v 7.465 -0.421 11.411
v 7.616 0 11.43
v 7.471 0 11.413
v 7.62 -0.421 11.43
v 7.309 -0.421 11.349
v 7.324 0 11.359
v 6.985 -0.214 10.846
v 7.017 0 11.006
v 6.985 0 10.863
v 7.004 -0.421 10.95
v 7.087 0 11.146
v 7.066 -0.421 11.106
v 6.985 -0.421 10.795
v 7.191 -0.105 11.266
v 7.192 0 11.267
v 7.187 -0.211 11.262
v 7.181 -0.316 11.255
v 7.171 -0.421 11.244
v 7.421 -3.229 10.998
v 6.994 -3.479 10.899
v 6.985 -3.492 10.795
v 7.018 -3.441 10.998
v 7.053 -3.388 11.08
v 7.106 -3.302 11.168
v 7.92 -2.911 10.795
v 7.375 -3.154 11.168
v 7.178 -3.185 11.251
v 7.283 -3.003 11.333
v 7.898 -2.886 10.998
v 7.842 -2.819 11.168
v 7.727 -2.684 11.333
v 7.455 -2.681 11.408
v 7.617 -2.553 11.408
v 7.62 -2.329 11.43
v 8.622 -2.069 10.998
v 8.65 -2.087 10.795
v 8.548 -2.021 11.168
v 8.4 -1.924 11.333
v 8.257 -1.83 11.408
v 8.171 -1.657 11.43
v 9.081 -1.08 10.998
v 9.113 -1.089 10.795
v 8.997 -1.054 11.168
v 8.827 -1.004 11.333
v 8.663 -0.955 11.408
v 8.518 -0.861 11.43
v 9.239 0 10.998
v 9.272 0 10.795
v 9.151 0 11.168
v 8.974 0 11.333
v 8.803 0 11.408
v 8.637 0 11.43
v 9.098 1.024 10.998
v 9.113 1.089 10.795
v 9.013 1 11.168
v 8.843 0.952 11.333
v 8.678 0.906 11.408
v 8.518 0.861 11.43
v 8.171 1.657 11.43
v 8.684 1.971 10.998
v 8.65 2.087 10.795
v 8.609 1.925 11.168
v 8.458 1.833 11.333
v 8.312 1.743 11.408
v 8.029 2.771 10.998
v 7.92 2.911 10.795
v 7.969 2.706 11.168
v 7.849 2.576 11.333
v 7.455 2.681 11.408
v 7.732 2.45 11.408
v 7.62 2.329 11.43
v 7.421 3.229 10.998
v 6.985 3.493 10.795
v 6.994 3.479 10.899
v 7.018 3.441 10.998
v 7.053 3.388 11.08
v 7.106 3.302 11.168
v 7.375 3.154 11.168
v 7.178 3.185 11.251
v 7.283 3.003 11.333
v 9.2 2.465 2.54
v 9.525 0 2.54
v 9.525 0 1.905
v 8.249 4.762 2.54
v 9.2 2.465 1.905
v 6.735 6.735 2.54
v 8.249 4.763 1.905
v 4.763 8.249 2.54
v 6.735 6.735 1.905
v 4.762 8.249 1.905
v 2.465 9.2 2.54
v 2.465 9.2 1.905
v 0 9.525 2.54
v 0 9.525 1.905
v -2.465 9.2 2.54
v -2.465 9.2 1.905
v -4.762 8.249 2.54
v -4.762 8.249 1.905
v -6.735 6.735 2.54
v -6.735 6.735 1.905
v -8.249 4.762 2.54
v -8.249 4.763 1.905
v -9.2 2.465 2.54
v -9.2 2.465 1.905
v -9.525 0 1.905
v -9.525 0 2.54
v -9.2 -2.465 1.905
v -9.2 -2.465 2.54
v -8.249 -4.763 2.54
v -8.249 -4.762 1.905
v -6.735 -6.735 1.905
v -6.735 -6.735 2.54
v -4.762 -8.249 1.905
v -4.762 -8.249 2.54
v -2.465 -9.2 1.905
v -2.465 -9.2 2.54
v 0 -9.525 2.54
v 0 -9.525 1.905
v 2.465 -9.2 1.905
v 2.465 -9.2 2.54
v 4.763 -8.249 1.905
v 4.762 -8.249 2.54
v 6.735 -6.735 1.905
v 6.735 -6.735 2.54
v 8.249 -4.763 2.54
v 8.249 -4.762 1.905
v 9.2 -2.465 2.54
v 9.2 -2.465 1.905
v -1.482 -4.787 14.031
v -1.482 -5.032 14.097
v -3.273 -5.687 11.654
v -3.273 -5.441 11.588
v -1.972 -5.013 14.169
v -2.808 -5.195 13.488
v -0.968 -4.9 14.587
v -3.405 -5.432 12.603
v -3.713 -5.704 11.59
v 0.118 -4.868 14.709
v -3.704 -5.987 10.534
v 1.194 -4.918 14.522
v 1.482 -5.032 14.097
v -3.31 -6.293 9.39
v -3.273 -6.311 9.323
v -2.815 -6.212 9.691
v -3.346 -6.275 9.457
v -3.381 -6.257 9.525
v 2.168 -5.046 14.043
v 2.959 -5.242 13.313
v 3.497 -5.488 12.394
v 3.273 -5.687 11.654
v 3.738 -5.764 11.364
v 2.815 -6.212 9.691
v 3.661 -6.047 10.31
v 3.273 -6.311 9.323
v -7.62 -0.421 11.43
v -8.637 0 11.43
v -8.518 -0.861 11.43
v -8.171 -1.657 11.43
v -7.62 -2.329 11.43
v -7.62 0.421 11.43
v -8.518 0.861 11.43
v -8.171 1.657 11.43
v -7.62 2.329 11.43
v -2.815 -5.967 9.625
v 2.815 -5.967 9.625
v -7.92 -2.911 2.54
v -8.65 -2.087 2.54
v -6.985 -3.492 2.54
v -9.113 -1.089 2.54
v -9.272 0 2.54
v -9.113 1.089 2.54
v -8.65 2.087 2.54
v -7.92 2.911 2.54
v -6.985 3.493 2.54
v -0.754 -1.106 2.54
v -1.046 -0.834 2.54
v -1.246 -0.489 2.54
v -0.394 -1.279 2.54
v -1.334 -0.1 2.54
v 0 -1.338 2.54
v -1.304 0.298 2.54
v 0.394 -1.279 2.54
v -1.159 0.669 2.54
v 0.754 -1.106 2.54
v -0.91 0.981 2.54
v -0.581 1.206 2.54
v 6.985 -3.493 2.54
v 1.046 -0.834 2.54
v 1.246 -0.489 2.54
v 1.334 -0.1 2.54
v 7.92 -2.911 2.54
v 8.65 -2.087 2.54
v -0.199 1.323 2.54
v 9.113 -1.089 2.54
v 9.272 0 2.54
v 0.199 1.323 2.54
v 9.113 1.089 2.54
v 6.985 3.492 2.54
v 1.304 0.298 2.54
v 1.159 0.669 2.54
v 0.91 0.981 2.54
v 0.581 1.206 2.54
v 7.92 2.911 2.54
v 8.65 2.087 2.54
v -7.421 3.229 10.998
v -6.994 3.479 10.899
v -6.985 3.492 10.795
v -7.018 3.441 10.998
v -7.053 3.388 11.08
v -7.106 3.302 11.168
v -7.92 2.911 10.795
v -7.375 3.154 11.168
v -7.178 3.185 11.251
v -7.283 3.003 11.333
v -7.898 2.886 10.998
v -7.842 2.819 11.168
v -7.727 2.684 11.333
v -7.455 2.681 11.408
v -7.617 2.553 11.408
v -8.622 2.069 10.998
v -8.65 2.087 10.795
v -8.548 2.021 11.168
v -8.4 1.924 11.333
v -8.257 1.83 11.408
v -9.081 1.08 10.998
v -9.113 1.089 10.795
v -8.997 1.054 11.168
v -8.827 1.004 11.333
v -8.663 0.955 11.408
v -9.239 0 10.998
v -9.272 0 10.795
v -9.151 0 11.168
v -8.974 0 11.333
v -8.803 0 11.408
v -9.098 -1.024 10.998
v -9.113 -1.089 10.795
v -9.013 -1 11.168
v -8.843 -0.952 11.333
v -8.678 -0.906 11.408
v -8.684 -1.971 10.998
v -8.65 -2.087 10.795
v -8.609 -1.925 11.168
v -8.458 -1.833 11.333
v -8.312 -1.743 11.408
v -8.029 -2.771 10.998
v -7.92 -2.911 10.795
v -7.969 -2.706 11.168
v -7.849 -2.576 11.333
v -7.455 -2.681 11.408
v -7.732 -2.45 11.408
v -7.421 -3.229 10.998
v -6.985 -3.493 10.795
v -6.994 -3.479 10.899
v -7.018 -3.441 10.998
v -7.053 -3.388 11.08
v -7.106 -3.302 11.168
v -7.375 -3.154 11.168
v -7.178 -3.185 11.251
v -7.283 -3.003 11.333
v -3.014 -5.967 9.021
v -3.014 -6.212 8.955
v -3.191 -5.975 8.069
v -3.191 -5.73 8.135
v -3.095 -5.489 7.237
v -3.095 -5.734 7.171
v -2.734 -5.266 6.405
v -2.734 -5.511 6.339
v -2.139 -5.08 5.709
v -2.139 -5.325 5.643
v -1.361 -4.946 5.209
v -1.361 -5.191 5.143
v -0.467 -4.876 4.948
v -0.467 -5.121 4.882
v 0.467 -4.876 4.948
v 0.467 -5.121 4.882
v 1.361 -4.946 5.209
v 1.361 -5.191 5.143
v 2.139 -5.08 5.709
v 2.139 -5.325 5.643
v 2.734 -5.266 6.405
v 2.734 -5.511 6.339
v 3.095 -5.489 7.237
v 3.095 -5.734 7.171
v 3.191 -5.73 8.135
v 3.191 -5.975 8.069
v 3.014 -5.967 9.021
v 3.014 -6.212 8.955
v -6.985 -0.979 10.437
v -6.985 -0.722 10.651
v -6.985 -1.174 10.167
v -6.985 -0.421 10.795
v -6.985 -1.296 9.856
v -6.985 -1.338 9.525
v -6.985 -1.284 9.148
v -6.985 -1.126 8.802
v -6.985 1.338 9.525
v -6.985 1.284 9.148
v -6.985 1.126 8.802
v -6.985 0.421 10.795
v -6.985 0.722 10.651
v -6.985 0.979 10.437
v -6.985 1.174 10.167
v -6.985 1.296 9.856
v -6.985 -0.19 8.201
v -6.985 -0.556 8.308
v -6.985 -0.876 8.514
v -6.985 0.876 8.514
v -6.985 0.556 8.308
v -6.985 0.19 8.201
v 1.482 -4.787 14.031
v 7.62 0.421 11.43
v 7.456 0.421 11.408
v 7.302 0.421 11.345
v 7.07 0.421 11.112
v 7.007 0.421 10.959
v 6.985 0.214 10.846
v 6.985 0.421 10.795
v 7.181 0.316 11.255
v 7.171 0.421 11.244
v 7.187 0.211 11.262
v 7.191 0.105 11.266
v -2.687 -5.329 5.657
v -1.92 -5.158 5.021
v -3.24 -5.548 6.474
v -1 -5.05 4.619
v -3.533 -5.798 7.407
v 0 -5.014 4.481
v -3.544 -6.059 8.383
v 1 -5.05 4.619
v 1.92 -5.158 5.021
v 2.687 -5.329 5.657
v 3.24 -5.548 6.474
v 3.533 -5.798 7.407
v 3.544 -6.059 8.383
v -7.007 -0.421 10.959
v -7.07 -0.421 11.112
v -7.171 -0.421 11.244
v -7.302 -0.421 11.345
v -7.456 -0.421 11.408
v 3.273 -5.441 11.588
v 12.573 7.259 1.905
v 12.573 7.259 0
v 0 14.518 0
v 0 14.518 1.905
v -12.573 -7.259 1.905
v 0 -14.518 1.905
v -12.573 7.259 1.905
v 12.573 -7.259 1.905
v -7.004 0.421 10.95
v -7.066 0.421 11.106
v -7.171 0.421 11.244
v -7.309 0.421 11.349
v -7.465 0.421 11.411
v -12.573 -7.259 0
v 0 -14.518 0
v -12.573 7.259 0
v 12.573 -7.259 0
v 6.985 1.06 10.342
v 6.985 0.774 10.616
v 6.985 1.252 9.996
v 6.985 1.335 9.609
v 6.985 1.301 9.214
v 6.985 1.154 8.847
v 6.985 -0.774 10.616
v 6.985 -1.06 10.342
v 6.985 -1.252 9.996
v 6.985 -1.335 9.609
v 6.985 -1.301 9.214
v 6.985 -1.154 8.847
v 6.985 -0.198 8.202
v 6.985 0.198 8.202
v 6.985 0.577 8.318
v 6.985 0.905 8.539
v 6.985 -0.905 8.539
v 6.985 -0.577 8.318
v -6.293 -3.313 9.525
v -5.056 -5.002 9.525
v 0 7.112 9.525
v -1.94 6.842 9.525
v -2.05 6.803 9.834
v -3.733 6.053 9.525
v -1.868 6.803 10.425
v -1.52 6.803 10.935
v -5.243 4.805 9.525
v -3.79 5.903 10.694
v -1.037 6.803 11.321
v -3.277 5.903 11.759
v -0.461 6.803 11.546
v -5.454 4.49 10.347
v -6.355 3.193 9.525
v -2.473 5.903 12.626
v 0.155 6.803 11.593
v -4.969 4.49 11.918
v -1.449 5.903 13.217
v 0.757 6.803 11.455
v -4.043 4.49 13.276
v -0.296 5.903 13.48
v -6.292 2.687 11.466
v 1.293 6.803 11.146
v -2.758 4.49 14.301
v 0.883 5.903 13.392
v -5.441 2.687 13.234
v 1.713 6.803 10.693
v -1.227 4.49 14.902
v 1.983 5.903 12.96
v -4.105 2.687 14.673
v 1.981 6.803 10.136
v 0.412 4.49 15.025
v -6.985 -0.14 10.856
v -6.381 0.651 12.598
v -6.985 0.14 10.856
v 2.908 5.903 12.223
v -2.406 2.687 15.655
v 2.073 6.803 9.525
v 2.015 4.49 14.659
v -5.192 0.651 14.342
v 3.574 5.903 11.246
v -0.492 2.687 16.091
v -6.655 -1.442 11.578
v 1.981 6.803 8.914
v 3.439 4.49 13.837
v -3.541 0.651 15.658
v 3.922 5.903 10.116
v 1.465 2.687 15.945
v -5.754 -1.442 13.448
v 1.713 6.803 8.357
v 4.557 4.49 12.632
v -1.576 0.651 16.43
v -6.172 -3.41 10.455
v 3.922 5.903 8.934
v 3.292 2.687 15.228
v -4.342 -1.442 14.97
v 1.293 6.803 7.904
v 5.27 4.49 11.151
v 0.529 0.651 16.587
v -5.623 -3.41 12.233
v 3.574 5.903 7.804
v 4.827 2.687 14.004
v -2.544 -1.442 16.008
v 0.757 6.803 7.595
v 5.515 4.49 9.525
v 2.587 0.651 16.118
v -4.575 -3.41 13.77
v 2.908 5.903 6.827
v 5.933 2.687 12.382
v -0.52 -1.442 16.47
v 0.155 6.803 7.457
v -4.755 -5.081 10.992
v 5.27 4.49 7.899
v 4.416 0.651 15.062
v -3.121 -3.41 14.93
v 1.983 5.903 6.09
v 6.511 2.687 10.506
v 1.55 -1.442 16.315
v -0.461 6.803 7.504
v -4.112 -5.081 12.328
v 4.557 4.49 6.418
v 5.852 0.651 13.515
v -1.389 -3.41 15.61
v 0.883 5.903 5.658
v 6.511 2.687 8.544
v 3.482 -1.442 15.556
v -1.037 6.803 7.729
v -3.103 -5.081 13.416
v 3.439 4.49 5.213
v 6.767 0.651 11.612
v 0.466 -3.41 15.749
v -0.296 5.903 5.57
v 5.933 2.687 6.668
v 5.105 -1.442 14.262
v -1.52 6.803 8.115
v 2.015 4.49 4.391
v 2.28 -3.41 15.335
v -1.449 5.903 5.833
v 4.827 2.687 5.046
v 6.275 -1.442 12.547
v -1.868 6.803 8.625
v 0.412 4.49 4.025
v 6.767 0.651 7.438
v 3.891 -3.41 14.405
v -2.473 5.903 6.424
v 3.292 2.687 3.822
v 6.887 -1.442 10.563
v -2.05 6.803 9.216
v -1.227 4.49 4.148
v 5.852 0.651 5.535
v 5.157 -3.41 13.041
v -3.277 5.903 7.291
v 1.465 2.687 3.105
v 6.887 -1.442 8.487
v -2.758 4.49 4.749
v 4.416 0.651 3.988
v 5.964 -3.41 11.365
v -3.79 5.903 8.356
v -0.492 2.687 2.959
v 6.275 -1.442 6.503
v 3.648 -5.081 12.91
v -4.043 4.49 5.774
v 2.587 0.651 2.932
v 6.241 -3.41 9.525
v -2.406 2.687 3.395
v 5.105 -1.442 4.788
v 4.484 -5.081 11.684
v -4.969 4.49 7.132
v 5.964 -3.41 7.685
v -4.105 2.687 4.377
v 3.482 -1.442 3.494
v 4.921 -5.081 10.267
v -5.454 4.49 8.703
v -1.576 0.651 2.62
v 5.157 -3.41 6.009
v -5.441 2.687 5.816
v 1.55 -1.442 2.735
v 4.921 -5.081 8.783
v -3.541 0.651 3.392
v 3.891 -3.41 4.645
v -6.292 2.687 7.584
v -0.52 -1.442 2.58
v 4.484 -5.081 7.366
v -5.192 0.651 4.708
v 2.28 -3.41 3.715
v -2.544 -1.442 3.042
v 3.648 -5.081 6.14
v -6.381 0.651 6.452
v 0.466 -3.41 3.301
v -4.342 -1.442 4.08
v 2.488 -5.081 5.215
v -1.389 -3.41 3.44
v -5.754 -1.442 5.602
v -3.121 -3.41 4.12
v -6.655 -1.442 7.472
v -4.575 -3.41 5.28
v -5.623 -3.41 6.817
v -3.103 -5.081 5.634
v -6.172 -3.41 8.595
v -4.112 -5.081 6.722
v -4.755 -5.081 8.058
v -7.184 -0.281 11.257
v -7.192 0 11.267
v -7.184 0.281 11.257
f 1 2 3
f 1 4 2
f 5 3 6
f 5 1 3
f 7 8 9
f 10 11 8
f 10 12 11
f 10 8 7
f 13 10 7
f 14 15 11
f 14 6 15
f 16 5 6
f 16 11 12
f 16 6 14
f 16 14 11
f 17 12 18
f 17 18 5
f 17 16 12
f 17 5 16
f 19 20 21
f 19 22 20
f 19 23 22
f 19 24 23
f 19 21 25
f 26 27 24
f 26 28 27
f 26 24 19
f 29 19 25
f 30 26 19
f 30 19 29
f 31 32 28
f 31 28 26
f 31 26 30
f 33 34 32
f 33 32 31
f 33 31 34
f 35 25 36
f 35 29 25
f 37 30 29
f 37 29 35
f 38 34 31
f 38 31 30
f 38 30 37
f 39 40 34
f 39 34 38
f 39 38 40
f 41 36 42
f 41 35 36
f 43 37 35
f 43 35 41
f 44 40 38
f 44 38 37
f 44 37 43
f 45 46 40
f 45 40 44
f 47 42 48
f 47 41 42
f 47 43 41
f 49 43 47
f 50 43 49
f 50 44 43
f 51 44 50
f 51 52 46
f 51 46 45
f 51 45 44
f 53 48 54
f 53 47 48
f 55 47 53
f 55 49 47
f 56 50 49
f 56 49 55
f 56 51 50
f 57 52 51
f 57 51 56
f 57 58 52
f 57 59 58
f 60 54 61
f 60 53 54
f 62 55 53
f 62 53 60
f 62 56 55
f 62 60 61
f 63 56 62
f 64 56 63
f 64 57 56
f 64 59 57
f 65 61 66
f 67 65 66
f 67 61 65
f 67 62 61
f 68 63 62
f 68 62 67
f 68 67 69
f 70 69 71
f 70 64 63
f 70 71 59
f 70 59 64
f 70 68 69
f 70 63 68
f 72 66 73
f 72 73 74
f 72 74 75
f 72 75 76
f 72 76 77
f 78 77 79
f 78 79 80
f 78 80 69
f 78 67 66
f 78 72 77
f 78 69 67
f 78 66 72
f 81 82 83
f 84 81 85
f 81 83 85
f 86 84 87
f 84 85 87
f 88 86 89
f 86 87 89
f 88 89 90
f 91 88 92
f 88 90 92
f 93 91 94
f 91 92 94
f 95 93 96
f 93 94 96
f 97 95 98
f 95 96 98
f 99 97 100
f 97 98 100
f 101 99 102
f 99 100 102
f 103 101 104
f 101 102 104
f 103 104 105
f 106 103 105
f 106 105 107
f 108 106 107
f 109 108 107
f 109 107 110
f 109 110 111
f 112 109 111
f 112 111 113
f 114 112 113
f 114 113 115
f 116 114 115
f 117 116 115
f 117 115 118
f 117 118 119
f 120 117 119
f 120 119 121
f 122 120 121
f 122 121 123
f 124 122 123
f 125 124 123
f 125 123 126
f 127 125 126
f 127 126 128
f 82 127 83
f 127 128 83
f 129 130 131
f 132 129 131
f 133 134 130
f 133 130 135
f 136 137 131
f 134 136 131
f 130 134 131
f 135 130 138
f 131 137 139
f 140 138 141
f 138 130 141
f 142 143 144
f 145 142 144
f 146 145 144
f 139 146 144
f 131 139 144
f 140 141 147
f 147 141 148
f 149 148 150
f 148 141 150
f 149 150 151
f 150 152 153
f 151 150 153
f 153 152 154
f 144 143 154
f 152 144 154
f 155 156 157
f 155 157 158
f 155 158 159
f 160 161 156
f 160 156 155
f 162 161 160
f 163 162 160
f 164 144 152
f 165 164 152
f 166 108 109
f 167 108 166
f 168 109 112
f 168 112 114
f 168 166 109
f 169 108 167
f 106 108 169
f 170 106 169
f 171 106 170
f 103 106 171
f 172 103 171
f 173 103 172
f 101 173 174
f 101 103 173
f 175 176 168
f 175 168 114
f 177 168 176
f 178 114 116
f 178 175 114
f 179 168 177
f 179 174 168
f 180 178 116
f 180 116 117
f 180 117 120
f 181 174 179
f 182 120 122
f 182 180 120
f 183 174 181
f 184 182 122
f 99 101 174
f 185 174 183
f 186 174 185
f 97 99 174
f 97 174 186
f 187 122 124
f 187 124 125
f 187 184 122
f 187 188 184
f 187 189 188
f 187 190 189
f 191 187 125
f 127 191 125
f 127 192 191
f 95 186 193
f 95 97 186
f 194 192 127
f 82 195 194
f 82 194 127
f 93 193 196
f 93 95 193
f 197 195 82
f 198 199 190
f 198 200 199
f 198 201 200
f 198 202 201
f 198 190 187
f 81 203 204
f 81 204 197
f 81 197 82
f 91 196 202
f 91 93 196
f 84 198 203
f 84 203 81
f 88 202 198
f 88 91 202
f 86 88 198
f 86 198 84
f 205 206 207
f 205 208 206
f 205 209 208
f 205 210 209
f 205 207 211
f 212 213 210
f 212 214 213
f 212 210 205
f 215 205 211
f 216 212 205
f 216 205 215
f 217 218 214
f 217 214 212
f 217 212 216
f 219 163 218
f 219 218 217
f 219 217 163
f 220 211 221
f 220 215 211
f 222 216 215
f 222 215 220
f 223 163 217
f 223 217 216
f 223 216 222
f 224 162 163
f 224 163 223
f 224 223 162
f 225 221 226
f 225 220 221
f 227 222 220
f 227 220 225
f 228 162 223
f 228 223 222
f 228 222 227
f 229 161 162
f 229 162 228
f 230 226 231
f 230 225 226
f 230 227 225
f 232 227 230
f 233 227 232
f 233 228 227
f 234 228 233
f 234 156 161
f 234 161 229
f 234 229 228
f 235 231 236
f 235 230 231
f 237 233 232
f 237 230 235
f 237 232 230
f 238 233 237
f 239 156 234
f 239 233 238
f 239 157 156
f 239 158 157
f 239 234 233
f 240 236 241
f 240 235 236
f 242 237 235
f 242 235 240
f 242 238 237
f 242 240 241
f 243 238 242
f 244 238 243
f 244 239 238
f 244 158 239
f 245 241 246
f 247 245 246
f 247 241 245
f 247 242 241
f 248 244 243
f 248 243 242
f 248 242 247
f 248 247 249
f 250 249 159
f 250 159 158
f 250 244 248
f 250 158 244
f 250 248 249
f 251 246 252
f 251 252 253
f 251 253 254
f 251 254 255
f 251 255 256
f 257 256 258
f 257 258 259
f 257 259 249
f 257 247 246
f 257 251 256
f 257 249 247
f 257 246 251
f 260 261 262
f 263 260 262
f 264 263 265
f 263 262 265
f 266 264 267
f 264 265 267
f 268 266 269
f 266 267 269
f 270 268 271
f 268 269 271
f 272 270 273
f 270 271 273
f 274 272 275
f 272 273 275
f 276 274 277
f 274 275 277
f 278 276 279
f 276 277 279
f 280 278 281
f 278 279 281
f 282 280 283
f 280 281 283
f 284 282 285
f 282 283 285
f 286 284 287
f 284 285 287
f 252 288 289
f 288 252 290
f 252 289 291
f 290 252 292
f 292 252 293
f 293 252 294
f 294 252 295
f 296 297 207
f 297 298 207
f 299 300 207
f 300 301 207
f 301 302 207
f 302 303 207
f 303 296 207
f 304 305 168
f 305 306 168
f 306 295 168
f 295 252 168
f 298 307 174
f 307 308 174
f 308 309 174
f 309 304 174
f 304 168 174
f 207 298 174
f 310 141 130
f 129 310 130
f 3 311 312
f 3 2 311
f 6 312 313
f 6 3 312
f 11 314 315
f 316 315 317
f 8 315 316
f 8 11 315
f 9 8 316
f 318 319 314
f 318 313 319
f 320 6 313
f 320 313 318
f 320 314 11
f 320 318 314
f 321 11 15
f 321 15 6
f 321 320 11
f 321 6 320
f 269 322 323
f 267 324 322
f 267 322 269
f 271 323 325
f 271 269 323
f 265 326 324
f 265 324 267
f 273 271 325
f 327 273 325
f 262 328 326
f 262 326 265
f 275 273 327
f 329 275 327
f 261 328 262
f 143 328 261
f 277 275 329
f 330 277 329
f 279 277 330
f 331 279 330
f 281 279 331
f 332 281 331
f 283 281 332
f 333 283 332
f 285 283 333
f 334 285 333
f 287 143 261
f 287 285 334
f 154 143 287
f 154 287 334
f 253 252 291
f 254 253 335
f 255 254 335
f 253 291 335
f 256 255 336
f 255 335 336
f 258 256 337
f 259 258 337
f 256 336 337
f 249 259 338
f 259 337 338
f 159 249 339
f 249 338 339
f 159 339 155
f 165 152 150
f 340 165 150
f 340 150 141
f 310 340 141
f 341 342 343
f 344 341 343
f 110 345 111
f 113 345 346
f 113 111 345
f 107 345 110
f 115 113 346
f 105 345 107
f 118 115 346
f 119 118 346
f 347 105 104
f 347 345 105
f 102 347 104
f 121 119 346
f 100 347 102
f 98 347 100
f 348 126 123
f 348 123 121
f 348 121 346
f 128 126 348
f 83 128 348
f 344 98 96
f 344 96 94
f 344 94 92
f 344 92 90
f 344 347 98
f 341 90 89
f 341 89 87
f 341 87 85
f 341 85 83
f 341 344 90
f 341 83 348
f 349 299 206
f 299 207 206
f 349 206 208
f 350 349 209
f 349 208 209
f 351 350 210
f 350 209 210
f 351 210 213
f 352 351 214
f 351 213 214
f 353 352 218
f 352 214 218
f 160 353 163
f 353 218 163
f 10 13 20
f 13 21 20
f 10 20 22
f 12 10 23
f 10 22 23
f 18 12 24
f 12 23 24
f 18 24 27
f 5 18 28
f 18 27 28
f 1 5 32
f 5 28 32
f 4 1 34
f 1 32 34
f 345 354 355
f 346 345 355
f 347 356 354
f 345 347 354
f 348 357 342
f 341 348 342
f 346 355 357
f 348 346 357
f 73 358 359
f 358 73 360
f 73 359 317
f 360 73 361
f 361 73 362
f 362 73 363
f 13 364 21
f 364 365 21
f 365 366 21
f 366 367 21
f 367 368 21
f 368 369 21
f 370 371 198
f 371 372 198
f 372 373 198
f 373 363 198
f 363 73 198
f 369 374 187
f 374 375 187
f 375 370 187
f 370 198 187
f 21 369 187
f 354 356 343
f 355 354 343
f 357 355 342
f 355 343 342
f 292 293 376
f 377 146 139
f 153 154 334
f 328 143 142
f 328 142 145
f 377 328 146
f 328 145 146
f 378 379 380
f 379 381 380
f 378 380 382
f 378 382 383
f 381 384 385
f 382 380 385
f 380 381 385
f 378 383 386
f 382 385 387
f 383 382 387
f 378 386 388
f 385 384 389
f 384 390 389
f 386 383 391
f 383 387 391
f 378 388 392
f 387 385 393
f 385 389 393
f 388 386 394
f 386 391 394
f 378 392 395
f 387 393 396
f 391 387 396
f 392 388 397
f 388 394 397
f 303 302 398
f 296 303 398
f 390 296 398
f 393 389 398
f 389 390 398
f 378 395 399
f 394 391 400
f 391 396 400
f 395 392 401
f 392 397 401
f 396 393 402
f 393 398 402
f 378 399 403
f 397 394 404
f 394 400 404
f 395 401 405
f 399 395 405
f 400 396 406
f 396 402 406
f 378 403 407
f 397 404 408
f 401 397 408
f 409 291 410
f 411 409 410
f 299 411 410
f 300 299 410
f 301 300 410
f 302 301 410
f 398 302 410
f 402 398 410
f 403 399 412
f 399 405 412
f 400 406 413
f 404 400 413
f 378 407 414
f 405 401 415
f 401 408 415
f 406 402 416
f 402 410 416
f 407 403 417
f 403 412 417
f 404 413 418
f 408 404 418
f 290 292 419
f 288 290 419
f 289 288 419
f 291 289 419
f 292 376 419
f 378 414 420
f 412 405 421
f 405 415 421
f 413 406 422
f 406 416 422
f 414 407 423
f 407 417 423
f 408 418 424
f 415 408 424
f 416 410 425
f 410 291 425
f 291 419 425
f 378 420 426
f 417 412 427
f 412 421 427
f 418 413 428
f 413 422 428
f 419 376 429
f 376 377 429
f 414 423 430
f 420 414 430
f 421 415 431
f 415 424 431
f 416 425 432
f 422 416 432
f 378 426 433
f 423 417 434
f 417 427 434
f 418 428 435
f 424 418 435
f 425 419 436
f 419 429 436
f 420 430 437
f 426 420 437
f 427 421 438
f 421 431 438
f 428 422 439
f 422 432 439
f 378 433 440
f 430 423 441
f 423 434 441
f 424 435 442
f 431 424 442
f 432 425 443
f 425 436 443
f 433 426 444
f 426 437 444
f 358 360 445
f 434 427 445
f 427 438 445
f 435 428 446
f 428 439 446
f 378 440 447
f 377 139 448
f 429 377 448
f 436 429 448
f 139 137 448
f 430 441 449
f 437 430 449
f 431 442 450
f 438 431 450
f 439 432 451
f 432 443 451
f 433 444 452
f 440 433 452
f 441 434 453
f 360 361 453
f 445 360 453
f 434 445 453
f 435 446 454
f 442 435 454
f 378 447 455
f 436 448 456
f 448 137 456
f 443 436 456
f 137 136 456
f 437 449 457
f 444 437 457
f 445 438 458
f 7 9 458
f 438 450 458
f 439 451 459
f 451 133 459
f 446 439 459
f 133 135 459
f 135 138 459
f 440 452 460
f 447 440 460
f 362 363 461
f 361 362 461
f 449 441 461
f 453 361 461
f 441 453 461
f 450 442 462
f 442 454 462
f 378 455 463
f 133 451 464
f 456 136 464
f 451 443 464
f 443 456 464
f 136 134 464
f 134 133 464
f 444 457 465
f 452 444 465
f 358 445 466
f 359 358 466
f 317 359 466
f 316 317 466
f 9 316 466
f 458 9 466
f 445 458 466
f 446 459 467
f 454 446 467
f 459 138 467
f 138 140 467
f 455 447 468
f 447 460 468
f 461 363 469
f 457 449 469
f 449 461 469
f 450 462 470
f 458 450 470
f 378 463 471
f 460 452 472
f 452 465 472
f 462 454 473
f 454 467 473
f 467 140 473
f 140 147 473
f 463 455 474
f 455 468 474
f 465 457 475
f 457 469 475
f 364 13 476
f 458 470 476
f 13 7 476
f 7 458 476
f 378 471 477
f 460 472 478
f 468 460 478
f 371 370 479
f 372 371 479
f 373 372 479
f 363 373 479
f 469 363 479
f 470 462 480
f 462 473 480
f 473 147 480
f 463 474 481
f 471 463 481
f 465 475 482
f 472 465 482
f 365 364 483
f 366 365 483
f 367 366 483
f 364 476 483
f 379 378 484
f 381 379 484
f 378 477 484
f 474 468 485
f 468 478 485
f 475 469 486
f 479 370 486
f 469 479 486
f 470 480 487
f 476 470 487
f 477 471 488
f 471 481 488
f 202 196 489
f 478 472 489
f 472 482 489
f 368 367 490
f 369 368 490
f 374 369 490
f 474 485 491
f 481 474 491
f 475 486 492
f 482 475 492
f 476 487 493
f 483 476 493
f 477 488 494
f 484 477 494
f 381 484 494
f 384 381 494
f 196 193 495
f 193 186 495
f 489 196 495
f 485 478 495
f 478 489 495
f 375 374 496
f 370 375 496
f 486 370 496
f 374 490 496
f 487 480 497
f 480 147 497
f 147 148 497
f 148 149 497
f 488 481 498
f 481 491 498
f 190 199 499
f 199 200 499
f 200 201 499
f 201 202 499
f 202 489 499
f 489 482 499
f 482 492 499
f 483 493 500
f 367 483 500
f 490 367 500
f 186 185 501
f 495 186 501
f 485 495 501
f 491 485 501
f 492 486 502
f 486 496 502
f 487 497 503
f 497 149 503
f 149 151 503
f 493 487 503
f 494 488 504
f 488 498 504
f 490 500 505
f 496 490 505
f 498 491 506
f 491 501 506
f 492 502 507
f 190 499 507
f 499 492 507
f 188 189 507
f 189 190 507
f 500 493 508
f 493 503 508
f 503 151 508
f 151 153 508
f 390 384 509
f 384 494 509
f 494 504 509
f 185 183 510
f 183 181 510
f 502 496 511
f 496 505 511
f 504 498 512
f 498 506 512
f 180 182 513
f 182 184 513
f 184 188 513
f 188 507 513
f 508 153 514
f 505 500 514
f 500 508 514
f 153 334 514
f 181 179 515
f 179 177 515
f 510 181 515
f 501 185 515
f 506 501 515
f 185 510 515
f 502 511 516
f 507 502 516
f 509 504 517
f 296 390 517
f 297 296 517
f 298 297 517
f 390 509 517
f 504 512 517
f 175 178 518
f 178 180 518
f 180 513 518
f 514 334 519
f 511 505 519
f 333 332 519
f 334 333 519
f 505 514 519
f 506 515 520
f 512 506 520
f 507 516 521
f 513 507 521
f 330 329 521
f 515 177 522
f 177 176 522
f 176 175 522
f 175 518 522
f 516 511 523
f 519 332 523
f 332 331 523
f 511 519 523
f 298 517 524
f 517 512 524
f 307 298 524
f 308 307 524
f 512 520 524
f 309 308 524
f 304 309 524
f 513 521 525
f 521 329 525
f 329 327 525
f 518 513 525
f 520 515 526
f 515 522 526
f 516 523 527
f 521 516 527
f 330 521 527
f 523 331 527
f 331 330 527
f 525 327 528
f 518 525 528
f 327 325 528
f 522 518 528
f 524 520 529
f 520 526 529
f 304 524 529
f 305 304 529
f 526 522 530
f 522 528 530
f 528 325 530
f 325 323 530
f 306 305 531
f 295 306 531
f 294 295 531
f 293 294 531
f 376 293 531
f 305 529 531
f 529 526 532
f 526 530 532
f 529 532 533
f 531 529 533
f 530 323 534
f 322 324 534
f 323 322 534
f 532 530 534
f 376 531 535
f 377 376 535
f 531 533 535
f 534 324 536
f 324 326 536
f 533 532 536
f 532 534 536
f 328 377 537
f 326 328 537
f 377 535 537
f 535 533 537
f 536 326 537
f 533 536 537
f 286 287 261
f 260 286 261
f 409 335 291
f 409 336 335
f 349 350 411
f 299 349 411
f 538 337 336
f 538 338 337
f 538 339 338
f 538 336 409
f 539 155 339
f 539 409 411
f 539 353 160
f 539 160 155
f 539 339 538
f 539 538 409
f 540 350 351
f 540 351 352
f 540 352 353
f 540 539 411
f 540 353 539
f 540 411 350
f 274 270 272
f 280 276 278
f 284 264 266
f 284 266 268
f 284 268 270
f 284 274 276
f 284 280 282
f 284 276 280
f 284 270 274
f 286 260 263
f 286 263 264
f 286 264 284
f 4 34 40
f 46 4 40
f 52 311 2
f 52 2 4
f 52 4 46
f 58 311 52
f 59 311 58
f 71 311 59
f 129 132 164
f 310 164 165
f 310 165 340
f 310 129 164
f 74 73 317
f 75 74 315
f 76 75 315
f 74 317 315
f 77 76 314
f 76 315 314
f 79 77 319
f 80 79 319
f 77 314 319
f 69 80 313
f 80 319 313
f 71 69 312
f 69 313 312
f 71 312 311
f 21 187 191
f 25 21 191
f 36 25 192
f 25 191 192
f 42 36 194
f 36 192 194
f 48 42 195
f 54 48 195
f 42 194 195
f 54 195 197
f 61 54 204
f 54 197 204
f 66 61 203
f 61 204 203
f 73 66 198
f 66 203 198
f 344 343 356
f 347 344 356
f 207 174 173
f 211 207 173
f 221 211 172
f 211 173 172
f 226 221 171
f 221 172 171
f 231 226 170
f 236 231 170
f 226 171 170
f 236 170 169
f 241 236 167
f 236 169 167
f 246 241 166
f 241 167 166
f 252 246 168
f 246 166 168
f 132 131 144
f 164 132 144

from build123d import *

# Parameters (mm, degrees)
F0_R      = 9.525
F1_DEPTH  = 1.905
F2_DEPTH  = 11.43
F6_R      = 0.635
F7_DEPTH  = 2.54
F10_W     = 10.16
F10_H     = 1.27
F11_DEPTH = 3.81
F12_W     = 10.16
F12_H     = 1.905
F13_DEPTH = 3.81
F15_DEPTH = 0.254
F17_DEPTH = 0.254


with BuildPart() as f1:
    # F0 (on Top) → F1 (new body)
    with BuildSketch(Plane.XY):
        Polygon((12.573, 7.2590249345), (0, 14.518049869), (-12.573, 7.2590249345), (-12.573, -7.2590249345), (0, -14.518049869), (12.573, -7.2590249345), align=None)
        Circle(F0_R, mode=Mode.SUBTRACT)
        Circle(F0_R)
        with BuildLine():
            ThreePointArc((-6.985, -3.4925), (-9.2723234913, 0), (-6.985, 3.4925))
            Line((-6.985, 3.4925), (-6.985, -3.4925))
        make_face(mode=Mode.SUBTRACT)
        with BuildLine():
            Line((6.985, -3.4925), (6.985, 3.4925))
            ThreePointArc((6.985, 3.4925), (9.2723234913, 0), (6.985, -3.4925))
        make_face(mode=Mode.SUBTRACT)
    extrude(amount=F1_DEPTH)

    # F0 (on Top) → F2 (join)
    with BuildSketch(Plane.XY):
        with BuildLine():
            Line((-6.985, -3.4925), (-6.985, 3.4925))
            ThreePointArc((-6.985, 3.4925), (-9.2723234913, 0), (-6.985, -3.4925))
        make_face()
        with BuildLine():
            ThreePointArc((6.985, -3.4925), (9.2723234913, 0), (6.985, 3.4925))
            Line((6.985, 3.4925), (6.985, -3.4925))
        make_face()
    extrude(amount=F2_DEPTH)

    # F4 (on offset) → F5 (revolve)
    with BuildSketch(Plane.XY.offset(9.525)):
        with BuildLine():
            ThreePointArc((0, 7.112), (-7.112, 0), (0, -7.112))
            Line((0, -7.112), (0, 7.112))
        make_face()
    revolve(axis=Axis((0, 0, 9.525), (0, 1, 0)))

    # F6
    f6_edges = [f1.edges().sort_by_distance(p)[0] for p in [
        (-6.985, 0, 11.43),
        (-9.272323, 0, 11.43),
        (6.985, 0, 11.43),
        (9.272323, 0, 11.43),
    ]]
    fillet(f6_edges, radius=F6_R)

    # F0 (on Top) → F7 (join)
    with BuildSketch(Plane.XY):
        Circle(F0_R)
        with BuildLine():
            ThreePointArc((-6.985, -3.4925), (-9.2723234913, 0), (-6.985, 3.4925))
            Line((-6.985, 3.4925), (-6.985, -3.4925))
        make_face(mode=Mode.SUBTRACT)
        with BuildLine():
            Line((6.985, -3.4925), (6.985, 3.4925))
            ThreePointArc((6.985, 3.4925), (9.2723234913, 0), (6.985, -3.4925))
        make_face(mode=Mode.SUBTRACT)
    extrude(amount=F7_DEPTH)

    # F10 (on line) → F11 (cut, symmetric)
    with BuildSketch(Plane(origin=(0, -2.38125, 8.8869459855), x_dir=(1, 0, 0), z_dir=(0, -0.2588190451, 0.9659258263))):
        with Locations((0, -4.318)):
            Rectangle(F10_W, F10_H)
    extrude(amount=F11_DEPTH, both=True, mode=Mode.SUBTRACT)

    # F12 (on line) → F13 (cut, symmetric)
    with BuildSketch(Plane(origin=(0, 2.38125, 8.8869459855), x_dir=(1, 0, 0), z_dir=(0, -0.2588190451, -0.9659258263))):
        with Locations((0, 9.4615)):
            Rectangle(F12_W, F12_H)
    extrude(amount=F13_DEPTH, both=True, mode=Mode.SUBTRACT)

    # F14 (on face) → F15 (cut)
    with BuildSketch(Plane(origin=(0, -3.5575048182, -0.9532305431), x_dir=(1, 0, 0), z_dir=(0, -0.9659258263, -0.2588190451))):
        with BuildLine():
            Line((3.0137271476, 10.2578568757), (-3.0137271476, 10.2578568757))
            ThreePointArc((-3.0137271476, 10.2578568757), (0, 6.0065940348), (3.0137271476, 10.2578568757))
        make_face()
    extrude(amount=-F15_DEPTH, mode=Mode.SUBTRACT)

    # F16 (on face) → F17 (cut)
    with BuildSketch(Plane(origin=(0, -8.2190628559, 2.2022912548), x_dir=(1, 0, 0), z_dir=(0, -0.9659258263, 0.2588190451))):
        Polygon((-3.2726924104, 9.7850203216), (-2.8154924104, 7.7530203216), (2.8154924104, 7.7530203216), (3.2726924104, 9.7850203216), (1.482303227, 12.3142628983), (-1.482303227, 12.3142628983), align=None)
    extrude(amount=-F17_DEPTH, mode=Mode.SUBTRACT)


solid = f1.part
